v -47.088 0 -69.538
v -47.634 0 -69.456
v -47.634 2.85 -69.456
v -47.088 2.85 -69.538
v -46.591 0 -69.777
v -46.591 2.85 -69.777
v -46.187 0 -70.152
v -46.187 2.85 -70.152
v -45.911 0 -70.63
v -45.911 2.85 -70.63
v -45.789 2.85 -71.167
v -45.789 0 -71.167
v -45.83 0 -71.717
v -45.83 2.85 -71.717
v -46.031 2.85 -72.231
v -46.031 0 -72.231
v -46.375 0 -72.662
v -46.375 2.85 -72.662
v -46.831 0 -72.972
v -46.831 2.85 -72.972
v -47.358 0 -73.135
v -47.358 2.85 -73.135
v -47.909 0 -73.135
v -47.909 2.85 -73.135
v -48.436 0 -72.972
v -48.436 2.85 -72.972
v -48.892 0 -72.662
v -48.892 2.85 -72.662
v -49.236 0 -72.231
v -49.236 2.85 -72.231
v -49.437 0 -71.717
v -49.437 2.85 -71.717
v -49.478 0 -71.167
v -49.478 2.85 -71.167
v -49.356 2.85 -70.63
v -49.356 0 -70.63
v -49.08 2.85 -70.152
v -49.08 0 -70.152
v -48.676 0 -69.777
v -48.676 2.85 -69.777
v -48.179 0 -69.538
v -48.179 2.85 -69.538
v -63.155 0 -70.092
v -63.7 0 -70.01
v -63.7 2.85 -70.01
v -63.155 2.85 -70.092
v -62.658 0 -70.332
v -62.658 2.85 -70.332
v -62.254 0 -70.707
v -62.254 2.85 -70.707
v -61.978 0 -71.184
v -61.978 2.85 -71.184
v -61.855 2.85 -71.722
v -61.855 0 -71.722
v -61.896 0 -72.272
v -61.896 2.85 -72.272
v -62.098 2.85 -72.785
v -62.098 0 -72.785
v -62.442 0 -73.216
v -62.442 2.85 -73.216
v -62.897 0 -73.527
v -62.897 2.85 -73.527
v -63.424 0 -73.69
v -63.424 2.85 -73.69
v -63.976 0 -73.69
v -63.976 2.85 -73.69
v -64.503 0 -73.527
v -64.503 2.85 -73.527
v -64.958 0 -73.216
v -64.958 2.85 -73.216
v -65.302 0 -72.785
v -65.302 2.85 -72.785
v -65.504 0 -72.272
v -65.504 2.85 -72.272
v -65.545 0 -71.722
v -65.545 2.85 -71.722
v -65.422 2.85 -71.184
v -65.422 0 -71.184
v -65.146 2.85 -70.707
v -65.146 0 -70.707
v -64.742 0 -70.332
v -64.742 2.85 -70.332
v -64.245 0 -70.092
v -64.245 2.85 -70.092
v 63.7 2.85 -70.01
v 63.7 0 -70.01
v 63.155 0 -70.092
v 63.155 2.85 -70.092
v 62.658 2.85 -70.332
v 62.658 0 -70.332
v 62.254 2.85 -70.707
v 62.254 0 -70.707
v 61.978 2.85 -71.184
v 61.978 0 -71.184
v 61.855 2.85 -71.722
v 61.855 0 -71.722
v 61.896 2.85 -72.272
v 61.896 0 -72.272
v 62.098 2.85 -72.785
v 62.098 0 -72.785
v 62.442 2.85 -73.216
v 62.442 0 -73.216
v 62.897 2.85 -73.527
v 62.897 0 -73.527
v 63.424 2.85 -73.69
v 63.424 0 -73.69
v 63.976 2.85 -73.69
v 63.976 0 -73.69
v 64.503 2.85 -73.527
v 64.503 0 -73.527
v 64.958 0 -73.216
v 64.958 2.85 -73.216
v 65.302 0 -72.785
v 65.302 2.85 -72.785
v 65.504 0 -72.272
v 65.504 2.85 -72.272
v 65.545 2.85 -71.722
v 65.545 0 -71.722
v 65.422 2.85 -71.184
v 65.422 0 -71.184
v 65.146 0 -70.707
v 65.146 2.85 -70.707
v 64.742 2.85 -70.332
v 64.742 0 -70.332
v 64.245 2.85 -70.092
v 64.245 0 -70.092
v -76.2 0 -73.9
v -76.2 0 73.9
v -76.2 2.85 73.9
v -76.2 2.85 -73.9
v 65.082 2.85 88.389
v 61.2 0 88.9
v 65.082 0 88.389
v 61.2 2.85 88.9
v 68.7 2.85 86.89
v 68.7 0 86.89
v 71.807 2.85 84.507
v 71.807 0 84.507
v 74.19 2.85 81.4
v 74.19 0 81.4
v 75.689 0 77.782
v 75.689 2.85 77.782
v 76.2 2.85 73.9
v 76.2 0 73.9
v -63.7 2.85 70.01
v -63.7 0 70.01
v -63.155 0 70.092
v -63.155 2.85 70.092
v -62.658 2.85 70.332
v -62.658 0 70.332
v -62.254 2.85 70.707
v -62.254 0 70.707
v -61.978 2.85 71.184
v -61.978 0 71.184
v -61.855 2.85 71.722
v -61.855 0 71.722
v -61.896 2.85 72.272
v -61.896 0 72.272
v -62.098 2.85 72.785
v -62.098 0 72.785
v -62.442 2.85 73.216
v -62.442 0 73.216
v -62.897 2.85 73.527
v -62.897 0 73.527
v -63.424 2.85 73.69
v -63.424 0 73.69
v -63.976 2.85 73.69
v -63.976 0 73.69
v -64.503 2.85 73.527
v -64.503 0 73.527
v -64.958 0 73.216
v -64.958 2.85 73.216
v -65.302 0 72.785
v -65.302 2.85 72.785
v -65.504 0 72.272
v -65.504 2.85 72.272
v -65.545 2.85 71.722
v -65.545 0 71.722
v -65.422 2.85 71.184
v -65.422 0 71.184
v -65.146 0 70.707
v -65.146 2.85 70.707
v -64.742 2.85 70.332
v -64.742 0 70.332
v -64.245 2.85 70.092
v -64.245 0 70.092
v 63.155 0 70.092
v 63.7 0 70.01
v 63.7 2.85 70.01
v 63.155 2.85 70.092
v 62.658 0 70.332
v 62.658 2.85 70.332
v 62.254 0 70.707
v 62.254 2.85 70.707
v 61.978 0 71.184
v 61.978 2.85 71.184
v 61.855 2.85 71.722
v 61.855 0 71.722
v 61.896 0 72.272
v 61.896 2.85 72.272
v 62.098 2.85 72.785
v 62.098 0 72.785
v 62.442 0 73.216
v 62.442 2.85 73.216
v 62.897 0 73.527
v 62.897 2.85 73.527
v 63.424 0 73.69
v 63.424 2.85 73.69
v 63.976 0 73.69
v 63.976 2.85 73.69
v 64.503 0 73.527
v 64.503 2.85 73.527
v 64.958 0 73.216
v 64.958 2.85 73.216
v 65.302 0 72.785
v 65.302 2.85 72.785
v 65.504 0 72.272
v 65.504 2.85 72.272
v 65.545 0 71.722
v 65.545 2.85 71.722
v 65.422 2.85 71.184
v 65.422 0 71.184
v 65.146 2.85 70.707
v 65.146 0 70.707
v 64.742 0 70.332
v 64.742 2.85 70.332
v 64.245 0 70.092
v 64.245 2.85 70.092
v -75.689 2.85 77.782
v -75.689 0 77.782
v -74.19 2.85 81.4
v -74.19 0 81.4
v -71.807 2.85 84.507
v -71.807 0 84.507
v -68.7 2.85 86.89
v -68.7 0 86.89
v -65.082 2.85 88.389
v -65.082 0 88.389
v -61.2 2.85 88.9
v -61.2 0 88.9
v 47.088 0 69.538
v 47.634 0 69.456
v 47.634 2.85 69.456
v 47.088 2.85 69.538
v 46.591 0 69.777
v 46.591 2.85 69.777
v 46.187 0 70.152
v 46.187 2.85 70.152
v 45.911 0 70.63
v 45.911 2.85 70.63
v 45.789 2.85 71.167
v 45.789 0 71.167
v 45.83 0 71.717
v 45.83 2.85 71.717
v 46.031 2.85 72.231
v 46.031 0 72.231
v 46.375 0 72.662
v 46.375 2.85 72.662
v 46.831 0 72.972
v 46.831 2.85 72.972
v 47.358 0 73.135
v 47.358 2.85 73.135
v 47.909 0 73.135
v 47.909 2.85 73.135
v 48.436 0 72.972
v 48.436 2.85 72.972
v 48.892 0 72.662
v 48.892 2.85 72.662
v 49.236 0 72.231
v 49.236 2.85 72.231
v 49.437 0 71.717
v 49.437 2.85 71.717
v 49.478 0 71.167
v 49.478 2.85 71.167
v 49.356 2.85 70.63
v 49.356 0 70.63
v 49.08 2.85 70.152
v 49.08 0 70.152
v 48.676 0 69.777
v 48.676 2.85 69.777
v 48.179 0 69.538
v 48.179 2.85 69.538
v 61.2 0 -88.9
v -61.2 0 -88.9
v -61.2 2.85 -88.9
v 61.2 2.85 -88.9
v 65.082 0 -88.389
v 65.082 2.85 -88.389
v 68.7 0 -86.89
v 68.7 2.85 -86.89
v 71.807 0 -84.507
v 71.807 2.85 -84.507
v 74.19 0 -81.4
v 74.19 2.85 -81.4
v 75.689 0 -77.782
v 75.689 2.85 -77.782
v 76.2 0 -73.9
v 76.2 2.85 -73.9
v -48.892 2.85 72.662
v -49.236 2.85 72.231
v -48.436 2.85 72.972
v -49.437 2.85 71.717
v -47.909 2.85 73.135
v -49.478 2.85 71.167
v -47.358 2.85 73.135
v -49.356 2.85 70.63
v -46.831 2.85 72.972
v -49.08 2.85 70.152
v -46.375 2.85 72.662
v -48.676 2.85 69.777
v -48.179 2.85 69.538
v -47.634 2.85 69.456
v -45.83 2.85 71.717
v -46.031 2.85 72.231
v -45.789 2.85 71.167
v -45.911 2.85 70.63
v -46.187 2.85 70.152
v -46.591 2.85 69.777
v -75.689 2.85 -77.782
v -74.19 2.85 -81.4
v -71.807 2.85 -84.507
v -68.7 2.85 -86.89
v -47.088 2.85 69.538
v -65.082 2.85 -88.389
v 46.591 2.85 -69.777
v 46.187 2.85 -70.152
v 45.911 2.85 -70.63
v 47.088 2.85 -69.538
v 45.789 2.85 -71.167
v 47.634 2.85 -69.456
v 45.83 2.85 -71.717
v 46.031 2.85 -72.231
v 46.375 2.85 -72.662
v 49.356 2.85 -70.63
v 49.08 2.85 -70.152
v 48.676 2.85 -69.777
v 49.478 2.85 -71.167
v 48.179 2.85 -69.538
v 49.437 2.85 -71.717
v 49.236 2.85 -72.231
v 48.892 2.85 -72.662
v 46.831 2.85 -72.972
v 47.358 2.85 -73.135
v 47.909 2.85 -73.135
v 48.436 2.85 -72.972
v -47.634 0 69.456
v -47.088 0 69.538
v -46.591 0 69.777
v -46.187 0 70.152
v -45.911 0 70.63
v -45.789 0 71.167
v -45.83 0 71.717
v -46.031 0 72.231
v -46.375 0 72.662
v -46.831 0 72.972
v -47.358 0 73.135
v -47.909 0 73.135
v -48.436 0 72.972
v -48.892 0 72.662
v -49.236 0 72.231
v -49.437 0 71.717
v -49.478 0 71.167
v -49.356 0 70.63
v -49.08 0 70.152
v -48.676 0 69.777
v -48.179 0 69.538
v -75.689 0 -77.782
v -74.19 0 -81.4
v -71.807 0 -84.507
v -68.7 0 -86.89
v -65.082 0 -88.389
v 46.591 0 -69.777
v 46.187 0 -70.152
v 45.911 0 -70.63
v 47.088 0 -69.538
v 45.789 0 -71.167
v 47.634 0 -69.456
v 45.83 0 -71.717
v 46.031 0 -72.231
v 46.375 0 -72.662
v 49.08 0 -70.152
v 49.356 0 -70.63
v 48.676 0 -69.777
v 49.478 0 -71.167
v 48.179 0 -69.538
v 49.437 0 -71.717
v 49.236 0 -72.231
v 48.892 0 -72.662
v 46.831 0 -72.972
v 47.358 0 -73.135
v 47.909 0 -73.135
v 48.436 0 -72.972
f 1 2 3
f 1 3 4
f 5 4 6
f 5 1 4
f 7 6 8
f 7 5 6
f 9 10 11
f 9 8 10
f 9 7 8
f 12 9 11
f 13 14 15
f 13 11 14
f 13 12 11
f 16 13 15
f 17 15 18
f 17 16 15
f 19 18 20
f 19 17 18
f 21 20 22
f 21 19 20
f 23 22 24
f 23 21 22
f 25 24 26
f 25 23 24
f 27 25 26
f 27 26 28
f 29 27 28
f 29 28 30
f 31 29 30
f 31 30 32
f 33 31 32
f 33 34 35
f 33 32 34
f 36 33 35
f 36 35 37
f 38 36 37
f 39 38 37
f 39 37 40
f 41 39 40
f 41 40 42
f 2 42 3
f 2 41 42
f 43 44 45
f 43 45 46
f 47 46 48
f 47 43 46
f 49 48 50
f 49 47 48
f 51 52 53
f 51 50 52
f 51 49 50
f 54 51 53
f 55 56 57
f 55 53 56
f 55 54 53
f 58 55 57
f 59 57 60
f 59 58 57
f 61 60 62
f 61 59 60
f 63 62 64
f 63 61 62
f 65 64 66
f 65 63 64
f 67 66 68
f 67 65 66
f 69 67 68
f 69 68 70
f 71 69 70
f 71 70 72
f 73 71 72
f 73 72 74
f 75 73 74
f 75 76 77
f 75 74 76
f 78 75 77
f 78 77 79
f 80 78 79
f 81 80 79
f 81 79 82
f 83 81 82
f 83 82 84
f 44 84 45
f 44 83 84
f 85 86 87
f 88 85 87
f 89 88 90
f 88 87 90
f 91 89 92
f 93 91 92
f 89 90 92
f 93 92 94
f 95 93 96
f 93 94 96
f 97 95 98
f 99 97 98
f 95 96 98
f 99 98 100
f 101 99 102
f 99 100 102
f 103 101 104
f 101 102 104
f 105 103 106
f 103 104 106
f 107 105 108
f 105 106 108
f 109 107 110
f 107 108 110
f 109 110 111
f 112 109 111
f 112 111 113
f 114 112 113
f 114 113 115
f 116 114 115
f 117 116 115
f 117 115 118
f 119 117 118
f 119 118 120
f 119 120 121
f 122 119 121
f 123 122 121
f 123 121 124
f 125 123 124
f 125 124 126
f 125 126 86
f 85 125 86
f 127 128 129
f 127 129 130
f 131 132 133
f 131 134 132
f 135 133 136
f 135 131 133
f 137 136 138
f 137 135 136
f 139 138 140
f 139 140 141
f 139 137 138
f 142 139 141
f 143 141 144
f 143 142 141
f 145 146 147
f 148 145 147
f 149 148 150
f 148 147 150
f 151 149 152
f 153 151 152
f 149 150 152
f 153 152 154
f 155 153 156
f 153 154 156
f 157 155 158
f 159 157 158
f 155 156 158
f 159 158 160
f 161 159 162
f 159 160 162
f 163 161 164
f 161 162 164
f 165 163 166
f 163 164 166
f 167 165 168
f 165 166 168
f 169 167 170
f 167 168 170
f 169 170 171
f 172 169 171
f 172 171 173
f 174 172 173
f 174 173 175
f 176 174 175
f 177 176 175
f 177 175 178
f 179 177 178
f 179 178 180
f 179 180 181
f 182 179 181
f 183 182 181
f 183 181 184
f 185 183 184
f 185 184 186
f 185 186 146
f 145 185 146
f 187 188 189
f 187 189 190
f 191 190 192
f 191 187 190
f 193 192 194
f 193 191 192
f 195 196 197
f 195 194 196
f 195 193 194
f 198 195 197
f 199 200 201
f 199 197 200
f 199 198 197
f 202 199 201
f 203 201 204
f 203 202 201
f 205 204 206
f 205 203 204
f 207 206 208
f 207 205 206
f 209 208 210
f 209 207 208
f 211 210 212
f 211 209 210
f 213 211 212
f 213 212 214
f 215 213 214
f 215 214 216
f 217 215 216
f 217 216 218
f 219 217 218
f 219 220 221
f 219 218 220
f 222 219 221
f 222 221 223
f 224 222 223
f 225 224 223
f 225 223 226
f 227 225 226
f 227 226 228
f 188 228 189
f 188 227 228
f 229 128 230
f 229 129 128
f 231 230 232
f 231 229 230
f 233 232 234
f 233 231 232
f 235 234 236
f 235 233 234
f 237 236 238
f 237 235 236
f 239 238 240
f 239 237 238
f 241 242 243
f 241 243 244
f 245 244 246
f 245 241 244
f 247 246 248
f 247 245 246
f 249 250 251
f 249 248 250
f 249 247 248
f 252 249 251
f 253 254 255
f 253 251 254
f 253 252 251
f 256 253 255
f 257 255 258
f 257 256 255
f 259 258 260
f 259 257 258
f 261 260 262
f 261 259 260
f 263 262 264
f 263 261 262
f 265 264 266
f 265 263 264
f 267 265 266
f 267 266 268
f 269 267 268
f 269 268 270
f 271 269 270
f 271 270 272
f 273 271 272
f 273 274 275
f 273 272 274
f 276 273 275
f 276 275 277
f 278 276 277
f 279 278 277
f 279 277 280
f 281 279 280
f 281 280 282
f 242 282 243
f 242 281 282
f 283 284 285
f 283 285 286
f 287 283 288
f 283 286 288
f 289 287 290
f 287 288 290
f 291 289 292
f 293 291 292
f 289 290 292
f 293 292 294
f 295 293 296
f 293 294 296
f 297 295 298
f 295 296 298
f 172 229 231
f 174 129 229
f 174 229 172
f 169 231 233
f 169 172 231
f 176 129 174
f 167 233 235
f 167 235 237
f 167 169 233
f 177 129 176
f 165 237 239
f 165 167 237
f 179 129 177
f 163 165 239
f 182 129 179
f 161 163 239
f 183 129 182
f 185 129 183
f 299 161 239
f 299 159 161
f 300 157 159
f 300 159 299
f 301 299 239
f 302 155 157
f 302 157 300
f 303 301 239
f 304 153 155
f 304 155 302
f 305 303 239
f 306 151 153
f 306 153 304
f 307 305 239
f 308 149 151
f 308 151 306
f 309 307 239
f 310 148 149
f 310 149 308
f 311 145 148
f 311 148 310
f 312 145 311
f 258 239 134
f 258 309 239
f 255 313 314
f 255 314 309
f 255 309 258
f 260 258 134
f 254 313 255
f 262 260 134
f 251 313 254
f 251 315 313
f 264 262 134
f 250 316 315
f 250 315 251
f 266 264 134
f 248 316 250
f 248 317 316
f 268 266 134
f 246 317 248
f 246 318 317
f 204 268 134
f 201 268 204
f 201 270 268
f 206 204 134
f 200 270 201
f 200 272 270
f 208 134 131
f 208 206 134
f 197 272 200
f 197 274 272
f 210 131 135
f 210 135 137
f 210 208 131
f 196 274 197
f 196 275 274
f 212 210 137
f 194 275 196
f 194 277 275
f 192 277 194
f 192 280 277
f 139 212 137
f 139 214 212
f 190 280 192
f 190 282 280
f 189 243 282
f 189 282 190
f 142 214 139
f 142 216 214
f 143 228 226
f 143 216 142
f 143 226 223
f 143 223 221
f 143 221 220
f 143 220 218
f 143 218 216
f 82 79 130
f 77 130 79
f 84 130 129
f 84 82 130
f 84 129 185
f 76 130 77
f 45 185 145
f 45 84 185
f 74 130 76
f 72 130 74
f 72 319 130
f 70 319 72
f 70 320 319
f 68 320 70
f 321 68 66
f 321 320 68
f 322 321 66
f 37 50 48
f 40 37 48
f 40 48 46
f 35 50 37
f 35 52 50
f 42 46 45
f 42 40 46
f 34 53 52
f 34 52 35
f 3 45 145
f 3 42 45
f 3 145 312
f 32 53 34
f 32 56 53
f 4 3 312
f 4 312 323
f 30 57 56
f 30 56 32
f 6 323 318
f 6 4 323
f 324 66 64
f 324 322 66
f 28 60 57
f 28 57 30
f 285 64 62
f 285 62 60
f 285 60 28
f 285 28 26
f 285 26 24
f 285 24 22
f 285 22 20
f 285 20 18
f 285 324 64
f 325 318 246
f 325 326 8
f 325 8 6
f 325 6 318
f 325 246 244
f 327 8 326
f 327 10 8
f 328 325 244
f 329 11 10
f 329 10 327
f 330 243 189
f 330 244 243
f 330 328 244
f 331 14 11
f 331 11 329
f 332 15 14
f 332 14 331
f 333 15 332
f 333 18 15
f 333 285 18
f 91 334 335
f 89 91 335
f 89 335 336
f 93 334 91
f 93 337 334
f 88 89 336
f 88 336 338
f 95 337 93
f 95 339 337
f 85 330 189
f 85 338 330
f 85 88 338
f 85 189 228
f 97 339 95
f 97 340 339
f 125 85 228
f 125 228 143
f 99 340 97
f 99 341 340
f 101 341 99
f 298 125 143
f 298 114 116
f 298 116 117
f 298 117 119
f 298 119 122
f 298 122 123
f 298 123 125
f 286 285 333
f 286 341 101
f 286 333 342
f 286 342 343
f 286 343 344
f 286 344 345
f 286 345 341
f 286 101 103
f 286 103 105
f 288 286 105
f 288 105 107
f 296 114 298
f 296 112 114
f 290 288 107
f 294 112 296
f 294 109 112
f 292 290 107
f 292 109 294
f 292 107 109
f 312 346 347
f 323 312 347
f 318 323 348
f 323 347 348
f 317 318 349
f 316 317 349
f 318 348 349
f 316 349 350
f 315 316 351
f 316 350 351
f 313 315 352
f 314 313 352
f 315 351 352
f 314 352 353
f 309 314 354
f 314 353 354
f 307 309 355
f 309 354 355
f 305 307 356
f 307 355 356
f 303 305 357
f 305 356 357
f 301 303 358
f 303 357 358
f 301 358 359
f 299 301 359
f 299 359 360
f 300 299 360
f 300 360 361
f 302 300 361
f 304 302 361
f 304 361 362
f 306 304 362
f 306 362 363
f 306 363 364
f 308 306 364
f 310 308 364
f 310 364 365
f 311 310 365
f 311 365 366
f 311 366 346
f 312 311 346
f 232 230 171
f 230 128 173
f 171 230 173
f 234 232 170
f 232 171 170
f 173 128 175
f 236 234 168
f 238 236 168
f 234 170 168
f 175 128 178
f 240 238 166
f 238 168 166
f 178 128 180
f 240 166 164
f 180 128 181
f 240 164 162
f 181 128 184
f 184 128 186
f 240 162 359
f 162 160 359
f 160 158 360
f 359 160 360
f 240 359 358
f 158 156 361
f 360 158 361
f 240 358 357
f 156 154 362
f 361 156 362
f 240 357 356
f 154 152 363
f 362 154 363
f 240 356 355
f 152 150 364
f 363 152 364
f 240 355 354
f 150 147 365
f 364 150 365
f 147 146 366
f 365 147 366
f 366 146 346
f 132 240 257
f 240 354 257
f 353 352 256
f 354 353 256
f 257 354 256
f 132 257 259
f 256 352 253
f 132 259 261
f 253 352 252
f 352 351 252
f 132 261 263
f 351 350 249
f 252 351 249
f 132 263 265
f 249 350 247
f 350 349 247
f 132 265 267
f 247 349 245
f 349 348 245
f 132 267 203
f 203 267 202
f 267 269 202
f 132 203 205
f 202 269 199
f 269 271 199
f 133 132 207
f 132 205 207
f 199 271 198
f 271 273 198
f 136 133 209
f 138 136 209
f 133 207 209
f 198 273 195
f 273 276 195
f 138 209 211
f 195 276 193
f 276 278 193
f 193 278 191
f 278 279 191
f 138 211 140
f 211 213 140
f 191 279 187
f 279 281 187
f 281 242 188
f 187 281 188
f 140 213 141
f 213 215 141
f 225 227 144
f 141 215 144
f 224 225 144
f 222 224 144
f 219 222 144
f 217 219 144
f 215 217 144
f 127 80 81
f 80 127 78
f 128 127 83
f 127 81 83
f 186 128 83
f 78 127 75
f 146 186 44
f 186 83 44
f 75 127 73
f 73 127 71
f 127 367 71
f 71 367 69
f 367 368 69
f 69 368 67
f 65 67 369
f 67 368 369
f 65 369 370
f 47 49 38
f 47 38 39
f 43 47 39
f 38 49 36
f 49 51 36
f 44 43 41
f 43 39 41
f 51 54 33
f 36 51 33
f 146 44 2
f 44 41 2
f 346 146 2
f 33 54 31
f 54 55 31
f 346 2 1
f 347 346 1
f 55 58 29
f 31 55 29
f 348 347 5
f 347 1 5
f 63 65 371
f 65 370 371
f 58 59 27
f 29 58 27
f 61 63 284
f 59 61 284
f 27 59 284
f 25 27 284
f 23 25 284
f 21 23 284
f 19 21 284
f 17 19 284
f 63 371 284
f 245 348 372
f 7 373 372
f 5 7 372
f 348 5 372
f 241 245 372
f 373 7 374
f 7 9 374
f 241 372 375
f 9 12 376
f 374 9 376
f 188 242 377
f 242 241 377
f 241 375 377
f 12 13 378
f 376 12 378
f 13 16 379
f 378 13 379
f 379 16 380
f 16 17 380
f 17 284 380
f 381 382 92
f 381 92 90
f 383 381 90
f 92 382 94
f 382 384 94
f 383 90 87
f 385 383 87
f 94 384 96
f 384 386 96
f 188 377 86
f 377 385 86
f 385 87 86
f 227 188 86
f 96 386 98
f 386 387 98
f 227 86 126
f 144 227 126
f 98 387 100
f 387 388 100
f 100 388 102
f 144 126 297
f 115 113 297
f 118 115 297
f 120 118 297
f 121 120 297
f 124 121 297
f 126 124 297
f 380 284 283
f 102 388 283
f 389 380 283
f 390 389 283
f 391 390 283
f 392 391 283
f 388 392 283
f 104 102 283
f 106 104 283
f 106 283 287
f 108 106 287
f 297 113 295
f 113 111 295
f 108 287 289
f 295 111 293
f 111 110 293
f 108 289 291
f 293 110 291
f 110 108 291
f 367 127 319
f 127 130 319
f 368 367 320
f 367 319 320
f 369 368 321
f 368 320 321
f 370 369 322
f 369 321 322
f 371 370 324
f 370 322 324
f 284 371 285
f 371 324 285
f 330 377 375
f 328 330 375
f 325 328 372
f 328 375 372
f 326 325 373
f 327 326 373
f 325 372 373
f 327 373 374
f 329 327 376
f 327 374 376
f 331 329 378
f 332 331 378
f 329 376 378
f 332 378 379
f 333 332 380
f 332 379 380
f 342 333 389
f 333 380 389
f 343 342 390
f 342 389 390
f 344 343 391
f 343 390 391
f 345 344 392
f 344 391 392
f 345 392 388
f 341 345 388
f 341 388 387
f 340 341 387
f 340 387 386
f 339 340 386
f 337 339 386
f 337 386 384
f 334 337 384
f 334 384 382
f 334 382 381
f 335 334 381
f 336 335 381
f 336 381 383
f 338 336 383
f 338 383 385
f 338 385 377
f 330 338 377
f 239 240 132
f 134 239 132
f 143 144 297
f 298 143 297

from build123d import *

# Parameters (mm, degrees)
SKETCH2_W               = 152.4
SKETCH2_H               = 177.8
BOSS_EXTRUDE2_DEPTH     = 2.85
SKETCH3_R               = 1.85
CUT_EXTRUDE1_DEPTH      = 118.188619328
MIRROR2_COPY_1_SKETCH_R = 1.85
MIRROR2_COPY_1_DEPTH    = 118.188619328
FILLET1_R               = 15


with BuildPart() as part:
    # Sketch2 → Boss-Extrude2 (new body)
    with BuildSketch(Plane(origin=(0, 0, 0), x_dir=(1, 0, 0), z_dir=(0, 1, 0))):
        Rectangle(SKETCH2_W, SKETCH2_H)
    extrude(amount=BOSS_EXTRUDE2_DEPTH)

    # Sketch3 → Cut-Extrude1 (cut, through all)
    with BuildSketch(Plane.XZ.offset(2)):
        with Locations(Location((-63.7, 71.86030802, 0), (0, 0, 270))):
            Circle(SKETCH3_R)
        with Locations(Location((-47.633605072, 71.30556155, 0), (0, 0, 270))):
            Circle(SKETCH3_R)
    cut_extrude1 = extrude(amount=-CUT_EXTRUDE1_DEPTH, mode=Mode.SUBTRACT)

    # Mirror1: Cut-Extrude1 across plane
    add(cut_extrude1.mirror(Plane.XY), mode=Mode.SUBTRACT)

    # Mirror2: Cut-Extrude1 across plane
    add(cut_extrude1.mirror(Plane(origin=(0, 0, 0), x_dir=(0, 0, 1), z_dir=(1, 0, 0))), mode=Mode.SUBTRACT)

    # Mirror2 copy 1 sketch → Mirror2 copy 1 (cut, through all)
    with BuildSketch(Plane(origin=(0, -2, 0), x_dir=(-1, 0, 0), z_dir=(0, -1, 0))):
        with Locations(Location((-63.7, 71.86030802, 0), (0, 0, 270))):
            Circle(MIRROR2_COPY_1_SKETCH_R)
        with Locations(Location((-47.633605072, 71.30556155, 0), (0, 0, 270))):
            Circle(MIRROR2_COPY_1_SKETCH_R)
    extrude(amount=-MIRROR2_COPY_1_DEPTH, mode=Mode.SUBTRACT)

    # Fillet1
    fillet1_edges = [part.edges().sort_by_distance(p)[0] for p in [
        (76.2, 1.425, 88.9),
        (-76.2, 1.425, 88.9),
        (-76.2, 1.425, -88.9),
        (76.2, 1.425, -88.9),
    ]]
    fillet(fillet1_edges, radius=FILLET1_R)


solid = part.part
